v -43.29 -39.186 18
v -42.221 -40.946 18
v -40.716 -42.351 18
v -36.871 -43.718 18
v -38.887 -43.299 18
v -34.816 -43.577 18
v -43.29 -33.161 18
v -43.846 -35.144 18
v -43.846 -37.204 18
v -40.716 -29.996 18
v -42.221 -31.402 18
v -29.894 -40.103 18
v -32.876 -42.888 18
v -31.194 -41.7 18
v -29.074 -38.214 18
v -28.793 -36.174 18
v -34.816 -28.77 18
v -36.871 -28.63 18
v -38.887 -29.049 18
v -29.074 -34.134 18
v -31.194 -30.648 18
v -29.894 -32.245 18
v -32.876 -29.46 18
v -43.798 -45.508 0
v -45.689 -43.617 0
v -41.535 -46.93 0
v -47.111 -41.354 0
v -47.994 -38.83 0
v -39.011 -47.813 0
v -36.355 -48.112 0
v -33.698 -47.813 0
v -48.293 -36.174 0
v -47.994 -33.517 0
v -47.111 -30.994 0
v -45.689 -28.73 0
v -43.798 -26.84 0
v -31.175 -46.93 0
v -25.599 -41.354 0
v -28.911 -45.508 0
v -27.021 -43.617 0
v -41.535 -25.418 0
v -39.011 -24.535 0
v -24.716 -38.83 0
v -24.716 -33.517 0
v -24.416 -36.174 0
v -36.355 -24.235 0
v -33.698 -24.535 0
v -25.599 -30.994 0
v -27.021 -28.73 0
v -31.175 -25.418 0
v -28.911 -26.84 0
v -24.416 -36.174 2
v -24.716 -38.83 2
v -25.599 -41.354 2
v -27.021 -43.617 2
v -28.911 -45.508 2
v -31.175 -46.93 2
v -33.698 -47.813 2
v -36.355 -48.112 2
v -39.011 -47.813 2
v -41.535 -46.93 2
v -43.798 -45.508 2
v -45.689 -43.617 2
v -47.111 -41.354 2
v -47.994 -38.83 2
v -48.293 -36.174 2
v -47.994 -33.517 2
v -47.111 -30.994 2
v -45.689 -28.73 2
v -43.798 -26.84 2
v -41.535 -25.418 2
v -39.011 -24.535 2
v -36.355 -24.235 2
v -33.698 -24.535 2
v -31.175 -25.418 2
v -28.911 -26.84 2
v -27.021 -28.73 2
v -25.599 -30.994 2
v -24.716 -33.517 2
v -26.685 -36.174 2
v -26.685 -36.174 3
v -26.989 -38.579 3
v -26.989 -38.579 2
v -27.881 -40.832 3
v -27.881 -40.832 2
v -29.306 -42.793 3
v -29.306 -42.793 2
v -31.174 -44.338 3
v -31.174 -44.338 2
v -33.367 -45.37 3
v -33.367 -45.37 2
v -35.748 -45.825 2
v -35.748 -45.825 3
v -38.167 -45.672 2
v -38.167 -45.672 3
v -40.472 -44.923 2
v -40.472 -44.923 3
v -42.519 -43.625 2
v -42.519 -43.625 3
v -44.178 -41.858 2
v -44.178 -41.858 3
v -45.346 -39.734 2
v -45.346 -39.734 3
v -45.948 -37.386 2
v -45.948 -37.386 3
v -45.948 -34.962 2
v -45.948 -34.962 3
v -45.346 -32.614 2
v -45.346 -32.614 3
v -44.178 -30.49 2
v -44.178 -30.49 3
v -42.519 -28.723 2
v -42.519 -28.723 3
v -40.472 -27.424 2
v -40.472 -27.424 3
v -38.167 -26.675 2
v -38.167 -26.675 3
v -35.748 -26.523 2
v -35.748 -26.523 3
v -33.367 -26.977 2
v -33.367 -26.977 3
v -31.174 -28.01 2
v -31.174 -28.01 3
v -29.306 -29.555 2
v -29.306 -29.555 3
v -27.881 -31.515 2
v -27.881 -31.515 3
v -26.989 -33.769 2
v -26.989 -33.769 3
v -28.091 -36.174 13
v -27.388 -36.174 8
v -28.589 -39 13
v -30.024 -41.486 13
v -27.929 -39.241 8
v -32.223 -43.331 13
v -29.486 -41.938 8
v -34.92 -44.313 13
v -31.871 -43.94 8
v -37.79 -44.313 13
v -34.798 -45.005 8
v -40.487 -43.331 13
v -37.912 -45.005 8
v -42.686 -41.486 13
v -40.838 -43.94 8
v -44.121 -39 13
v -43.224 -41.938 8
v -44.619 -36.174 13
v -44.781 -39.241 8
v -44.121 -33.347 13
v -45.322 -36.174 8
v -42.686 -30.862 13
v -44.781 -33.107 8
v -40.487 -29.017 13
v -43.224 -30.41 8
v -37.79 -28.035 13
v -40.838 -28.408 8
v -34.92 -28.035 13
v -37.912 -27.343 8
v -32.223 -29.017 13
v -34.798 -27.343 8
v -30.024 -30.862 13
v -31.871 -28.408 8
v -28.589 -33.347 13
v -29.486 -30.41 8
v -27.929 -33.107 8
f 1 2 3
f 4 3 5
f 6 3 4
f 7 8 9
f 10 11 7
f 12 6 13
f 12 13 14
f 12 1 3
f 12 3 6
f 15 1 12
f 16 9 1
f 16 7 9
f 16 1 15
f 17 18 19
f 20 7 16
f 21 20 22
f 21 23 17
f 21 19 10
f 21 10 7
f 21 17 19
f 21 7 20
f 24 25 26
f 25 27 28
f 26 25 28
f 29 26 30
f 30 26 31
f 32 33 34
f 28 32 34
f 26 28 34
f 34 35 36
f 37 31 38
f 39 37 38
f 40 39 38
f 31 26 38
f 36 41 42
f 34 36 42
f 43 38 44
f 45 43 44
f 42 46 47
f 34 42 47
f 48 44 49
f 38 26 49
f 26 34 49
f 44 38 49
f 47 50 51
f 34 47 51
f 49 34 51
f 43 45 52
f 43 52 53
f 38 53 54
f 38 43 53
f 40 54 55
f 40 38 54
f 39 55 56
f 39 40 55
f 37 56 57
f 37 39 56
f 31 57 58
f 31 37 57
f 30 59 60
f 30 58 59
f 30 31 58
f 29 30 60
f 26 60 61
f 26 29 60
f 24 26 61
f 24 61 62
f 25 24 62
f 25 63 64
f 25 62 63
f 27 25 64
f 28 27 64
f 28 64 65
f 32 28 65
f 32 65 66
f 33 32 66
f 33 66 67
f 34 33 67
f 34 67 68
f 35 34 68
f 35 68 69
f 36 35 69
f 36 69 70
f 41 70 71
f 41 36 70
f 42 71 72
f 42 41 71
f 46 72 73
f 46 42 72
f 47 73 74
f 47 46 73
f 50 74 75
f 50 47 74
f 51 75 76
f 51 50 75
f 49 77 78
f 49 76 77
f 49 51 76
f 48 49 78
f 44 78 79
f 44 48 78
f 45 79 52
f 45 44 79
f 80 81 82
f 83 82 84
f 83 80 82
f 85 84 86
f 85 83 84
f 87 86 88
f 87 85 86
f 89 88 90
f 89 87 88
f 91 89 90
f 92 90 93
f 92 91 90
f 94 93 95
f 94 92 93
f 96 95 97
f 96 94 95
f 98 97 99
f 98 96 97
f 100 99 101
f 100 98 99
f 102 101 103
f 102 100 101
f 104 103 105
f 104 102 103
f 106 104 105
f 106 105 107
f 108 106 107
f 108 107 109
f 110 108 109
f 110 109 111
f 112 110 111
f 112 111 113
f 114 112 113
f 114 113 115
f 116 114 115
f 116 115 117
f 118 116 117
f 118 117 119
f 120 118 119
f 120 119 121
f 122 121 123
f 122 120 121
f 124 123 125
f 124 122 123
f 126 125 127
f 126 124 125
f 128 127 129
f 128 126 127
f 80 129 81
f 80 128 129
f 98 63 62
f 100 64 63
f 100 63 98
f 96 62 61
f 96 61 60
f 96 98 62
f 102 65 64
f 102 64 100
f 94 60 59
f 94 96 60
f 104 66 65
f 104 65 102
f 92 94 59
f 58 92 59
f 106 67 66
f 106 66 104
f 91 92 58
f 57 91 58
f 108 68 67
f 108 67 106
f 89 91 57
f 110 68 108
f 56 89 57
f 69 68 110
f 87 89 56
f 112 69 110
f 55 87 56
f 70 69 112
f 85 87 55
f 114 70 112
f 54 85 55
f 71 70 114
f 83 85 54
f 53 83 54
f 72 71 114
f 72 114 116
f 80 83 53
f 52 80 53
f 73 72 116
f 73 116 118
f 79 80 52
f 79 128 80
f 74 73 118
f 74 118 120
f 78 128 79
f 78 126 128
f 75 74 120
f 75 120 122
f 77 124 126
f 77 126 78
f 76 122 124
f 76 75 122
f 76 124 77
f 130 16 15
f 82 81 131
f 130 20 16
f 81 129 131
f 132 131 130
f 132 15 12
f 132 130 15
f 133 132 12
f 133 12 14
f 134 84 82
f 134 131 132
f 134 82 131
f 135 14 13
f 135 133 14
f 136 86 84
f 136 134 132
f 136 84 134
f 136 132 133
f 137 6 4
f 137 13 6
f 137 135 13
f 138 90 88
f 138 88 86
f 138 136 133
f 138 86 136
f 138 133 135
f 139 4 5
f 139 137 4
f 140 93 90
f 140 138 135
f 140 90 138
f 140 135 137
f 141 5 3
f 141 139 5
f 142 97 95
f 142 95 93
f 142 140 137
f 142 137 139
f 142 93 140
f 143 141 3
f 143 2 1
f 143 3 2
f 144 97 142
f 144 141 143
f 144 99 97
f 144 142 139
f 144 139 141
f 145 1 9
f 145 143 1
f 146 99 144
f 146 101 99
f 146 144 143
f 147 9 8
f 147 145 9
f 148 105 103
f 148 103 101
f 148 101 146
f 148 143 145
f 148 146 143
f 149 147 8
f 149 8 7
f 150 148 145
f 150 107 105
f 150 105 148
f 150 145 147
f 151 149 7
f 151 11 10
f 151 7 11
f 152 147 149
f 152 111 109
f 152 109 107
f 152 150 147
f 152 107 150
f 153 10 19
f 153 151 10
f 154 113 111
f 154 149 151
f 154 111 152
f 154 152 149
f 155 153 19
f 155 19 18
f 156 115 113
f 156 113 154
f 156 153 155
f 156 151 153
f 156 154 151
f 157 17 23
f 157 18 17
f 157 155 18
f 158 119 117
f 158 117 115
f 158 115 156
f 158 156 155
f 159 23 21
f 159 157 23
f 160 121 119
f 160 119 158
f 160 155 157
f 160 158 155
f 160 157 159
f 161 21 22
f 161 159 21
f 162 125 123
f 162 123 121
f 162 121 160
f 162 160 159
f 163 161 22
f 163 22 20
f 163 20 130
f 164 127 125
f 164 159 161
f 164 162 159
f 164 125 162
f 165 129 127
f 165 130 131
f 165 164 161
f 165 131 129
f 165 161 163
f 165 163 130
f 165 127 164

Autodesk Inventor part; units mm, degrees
ref_plane "YZ Plane" through (0, 0, 0) normal (1, 0, 0) x (0, 1, 0)
ref_plane "XZ Plane" through (0, 0, 0) normal (0, 1, 0) x (-1, 0, 0)
ref_plane "XY Plane" through (0, 0, 0) normal (0, 0, 1) x (1, 0, 0)
sketch "Sketch1" plane through (0, 0, 0) normal (0, 0, 1) x (1, 0, 0)
  arc A0 (-34.8899, -33.6307) -> (-34.8899, -38.7172) centre (-36.3549, -36.1739) ccw projected
  circle A1 centre (-36.3549, -36.1739) radius 9.6697
  point P0 (0, 0)
extrude "Extrusion1" add sketch "Sketch1" along normal blind 18
chamfer "Chamfer2" distance 15 angle 8 1 edges at (-46.0245, -36.1739, 18) measured on face at (-26.7165, -36.952, 12)
ref_plane "Work Plane1" through (0, 0, 0) normal (0, 0, 1) x (1, 0, 0)
sketch "Sketch2" plane through (0, 0, 0) normal (0, 0, 1) x (1, 0, 0)
  circle A0 centre (-36.3549, -36.1739) radius 7.5616 projected
  circle A1 centre (-36.3549, -36.1739) radius 11.9385
  point P0 (0, 0)
extrude "Extrusion2" add sketch "Sketch2" along normal blind 2
properties part number "Knob"
